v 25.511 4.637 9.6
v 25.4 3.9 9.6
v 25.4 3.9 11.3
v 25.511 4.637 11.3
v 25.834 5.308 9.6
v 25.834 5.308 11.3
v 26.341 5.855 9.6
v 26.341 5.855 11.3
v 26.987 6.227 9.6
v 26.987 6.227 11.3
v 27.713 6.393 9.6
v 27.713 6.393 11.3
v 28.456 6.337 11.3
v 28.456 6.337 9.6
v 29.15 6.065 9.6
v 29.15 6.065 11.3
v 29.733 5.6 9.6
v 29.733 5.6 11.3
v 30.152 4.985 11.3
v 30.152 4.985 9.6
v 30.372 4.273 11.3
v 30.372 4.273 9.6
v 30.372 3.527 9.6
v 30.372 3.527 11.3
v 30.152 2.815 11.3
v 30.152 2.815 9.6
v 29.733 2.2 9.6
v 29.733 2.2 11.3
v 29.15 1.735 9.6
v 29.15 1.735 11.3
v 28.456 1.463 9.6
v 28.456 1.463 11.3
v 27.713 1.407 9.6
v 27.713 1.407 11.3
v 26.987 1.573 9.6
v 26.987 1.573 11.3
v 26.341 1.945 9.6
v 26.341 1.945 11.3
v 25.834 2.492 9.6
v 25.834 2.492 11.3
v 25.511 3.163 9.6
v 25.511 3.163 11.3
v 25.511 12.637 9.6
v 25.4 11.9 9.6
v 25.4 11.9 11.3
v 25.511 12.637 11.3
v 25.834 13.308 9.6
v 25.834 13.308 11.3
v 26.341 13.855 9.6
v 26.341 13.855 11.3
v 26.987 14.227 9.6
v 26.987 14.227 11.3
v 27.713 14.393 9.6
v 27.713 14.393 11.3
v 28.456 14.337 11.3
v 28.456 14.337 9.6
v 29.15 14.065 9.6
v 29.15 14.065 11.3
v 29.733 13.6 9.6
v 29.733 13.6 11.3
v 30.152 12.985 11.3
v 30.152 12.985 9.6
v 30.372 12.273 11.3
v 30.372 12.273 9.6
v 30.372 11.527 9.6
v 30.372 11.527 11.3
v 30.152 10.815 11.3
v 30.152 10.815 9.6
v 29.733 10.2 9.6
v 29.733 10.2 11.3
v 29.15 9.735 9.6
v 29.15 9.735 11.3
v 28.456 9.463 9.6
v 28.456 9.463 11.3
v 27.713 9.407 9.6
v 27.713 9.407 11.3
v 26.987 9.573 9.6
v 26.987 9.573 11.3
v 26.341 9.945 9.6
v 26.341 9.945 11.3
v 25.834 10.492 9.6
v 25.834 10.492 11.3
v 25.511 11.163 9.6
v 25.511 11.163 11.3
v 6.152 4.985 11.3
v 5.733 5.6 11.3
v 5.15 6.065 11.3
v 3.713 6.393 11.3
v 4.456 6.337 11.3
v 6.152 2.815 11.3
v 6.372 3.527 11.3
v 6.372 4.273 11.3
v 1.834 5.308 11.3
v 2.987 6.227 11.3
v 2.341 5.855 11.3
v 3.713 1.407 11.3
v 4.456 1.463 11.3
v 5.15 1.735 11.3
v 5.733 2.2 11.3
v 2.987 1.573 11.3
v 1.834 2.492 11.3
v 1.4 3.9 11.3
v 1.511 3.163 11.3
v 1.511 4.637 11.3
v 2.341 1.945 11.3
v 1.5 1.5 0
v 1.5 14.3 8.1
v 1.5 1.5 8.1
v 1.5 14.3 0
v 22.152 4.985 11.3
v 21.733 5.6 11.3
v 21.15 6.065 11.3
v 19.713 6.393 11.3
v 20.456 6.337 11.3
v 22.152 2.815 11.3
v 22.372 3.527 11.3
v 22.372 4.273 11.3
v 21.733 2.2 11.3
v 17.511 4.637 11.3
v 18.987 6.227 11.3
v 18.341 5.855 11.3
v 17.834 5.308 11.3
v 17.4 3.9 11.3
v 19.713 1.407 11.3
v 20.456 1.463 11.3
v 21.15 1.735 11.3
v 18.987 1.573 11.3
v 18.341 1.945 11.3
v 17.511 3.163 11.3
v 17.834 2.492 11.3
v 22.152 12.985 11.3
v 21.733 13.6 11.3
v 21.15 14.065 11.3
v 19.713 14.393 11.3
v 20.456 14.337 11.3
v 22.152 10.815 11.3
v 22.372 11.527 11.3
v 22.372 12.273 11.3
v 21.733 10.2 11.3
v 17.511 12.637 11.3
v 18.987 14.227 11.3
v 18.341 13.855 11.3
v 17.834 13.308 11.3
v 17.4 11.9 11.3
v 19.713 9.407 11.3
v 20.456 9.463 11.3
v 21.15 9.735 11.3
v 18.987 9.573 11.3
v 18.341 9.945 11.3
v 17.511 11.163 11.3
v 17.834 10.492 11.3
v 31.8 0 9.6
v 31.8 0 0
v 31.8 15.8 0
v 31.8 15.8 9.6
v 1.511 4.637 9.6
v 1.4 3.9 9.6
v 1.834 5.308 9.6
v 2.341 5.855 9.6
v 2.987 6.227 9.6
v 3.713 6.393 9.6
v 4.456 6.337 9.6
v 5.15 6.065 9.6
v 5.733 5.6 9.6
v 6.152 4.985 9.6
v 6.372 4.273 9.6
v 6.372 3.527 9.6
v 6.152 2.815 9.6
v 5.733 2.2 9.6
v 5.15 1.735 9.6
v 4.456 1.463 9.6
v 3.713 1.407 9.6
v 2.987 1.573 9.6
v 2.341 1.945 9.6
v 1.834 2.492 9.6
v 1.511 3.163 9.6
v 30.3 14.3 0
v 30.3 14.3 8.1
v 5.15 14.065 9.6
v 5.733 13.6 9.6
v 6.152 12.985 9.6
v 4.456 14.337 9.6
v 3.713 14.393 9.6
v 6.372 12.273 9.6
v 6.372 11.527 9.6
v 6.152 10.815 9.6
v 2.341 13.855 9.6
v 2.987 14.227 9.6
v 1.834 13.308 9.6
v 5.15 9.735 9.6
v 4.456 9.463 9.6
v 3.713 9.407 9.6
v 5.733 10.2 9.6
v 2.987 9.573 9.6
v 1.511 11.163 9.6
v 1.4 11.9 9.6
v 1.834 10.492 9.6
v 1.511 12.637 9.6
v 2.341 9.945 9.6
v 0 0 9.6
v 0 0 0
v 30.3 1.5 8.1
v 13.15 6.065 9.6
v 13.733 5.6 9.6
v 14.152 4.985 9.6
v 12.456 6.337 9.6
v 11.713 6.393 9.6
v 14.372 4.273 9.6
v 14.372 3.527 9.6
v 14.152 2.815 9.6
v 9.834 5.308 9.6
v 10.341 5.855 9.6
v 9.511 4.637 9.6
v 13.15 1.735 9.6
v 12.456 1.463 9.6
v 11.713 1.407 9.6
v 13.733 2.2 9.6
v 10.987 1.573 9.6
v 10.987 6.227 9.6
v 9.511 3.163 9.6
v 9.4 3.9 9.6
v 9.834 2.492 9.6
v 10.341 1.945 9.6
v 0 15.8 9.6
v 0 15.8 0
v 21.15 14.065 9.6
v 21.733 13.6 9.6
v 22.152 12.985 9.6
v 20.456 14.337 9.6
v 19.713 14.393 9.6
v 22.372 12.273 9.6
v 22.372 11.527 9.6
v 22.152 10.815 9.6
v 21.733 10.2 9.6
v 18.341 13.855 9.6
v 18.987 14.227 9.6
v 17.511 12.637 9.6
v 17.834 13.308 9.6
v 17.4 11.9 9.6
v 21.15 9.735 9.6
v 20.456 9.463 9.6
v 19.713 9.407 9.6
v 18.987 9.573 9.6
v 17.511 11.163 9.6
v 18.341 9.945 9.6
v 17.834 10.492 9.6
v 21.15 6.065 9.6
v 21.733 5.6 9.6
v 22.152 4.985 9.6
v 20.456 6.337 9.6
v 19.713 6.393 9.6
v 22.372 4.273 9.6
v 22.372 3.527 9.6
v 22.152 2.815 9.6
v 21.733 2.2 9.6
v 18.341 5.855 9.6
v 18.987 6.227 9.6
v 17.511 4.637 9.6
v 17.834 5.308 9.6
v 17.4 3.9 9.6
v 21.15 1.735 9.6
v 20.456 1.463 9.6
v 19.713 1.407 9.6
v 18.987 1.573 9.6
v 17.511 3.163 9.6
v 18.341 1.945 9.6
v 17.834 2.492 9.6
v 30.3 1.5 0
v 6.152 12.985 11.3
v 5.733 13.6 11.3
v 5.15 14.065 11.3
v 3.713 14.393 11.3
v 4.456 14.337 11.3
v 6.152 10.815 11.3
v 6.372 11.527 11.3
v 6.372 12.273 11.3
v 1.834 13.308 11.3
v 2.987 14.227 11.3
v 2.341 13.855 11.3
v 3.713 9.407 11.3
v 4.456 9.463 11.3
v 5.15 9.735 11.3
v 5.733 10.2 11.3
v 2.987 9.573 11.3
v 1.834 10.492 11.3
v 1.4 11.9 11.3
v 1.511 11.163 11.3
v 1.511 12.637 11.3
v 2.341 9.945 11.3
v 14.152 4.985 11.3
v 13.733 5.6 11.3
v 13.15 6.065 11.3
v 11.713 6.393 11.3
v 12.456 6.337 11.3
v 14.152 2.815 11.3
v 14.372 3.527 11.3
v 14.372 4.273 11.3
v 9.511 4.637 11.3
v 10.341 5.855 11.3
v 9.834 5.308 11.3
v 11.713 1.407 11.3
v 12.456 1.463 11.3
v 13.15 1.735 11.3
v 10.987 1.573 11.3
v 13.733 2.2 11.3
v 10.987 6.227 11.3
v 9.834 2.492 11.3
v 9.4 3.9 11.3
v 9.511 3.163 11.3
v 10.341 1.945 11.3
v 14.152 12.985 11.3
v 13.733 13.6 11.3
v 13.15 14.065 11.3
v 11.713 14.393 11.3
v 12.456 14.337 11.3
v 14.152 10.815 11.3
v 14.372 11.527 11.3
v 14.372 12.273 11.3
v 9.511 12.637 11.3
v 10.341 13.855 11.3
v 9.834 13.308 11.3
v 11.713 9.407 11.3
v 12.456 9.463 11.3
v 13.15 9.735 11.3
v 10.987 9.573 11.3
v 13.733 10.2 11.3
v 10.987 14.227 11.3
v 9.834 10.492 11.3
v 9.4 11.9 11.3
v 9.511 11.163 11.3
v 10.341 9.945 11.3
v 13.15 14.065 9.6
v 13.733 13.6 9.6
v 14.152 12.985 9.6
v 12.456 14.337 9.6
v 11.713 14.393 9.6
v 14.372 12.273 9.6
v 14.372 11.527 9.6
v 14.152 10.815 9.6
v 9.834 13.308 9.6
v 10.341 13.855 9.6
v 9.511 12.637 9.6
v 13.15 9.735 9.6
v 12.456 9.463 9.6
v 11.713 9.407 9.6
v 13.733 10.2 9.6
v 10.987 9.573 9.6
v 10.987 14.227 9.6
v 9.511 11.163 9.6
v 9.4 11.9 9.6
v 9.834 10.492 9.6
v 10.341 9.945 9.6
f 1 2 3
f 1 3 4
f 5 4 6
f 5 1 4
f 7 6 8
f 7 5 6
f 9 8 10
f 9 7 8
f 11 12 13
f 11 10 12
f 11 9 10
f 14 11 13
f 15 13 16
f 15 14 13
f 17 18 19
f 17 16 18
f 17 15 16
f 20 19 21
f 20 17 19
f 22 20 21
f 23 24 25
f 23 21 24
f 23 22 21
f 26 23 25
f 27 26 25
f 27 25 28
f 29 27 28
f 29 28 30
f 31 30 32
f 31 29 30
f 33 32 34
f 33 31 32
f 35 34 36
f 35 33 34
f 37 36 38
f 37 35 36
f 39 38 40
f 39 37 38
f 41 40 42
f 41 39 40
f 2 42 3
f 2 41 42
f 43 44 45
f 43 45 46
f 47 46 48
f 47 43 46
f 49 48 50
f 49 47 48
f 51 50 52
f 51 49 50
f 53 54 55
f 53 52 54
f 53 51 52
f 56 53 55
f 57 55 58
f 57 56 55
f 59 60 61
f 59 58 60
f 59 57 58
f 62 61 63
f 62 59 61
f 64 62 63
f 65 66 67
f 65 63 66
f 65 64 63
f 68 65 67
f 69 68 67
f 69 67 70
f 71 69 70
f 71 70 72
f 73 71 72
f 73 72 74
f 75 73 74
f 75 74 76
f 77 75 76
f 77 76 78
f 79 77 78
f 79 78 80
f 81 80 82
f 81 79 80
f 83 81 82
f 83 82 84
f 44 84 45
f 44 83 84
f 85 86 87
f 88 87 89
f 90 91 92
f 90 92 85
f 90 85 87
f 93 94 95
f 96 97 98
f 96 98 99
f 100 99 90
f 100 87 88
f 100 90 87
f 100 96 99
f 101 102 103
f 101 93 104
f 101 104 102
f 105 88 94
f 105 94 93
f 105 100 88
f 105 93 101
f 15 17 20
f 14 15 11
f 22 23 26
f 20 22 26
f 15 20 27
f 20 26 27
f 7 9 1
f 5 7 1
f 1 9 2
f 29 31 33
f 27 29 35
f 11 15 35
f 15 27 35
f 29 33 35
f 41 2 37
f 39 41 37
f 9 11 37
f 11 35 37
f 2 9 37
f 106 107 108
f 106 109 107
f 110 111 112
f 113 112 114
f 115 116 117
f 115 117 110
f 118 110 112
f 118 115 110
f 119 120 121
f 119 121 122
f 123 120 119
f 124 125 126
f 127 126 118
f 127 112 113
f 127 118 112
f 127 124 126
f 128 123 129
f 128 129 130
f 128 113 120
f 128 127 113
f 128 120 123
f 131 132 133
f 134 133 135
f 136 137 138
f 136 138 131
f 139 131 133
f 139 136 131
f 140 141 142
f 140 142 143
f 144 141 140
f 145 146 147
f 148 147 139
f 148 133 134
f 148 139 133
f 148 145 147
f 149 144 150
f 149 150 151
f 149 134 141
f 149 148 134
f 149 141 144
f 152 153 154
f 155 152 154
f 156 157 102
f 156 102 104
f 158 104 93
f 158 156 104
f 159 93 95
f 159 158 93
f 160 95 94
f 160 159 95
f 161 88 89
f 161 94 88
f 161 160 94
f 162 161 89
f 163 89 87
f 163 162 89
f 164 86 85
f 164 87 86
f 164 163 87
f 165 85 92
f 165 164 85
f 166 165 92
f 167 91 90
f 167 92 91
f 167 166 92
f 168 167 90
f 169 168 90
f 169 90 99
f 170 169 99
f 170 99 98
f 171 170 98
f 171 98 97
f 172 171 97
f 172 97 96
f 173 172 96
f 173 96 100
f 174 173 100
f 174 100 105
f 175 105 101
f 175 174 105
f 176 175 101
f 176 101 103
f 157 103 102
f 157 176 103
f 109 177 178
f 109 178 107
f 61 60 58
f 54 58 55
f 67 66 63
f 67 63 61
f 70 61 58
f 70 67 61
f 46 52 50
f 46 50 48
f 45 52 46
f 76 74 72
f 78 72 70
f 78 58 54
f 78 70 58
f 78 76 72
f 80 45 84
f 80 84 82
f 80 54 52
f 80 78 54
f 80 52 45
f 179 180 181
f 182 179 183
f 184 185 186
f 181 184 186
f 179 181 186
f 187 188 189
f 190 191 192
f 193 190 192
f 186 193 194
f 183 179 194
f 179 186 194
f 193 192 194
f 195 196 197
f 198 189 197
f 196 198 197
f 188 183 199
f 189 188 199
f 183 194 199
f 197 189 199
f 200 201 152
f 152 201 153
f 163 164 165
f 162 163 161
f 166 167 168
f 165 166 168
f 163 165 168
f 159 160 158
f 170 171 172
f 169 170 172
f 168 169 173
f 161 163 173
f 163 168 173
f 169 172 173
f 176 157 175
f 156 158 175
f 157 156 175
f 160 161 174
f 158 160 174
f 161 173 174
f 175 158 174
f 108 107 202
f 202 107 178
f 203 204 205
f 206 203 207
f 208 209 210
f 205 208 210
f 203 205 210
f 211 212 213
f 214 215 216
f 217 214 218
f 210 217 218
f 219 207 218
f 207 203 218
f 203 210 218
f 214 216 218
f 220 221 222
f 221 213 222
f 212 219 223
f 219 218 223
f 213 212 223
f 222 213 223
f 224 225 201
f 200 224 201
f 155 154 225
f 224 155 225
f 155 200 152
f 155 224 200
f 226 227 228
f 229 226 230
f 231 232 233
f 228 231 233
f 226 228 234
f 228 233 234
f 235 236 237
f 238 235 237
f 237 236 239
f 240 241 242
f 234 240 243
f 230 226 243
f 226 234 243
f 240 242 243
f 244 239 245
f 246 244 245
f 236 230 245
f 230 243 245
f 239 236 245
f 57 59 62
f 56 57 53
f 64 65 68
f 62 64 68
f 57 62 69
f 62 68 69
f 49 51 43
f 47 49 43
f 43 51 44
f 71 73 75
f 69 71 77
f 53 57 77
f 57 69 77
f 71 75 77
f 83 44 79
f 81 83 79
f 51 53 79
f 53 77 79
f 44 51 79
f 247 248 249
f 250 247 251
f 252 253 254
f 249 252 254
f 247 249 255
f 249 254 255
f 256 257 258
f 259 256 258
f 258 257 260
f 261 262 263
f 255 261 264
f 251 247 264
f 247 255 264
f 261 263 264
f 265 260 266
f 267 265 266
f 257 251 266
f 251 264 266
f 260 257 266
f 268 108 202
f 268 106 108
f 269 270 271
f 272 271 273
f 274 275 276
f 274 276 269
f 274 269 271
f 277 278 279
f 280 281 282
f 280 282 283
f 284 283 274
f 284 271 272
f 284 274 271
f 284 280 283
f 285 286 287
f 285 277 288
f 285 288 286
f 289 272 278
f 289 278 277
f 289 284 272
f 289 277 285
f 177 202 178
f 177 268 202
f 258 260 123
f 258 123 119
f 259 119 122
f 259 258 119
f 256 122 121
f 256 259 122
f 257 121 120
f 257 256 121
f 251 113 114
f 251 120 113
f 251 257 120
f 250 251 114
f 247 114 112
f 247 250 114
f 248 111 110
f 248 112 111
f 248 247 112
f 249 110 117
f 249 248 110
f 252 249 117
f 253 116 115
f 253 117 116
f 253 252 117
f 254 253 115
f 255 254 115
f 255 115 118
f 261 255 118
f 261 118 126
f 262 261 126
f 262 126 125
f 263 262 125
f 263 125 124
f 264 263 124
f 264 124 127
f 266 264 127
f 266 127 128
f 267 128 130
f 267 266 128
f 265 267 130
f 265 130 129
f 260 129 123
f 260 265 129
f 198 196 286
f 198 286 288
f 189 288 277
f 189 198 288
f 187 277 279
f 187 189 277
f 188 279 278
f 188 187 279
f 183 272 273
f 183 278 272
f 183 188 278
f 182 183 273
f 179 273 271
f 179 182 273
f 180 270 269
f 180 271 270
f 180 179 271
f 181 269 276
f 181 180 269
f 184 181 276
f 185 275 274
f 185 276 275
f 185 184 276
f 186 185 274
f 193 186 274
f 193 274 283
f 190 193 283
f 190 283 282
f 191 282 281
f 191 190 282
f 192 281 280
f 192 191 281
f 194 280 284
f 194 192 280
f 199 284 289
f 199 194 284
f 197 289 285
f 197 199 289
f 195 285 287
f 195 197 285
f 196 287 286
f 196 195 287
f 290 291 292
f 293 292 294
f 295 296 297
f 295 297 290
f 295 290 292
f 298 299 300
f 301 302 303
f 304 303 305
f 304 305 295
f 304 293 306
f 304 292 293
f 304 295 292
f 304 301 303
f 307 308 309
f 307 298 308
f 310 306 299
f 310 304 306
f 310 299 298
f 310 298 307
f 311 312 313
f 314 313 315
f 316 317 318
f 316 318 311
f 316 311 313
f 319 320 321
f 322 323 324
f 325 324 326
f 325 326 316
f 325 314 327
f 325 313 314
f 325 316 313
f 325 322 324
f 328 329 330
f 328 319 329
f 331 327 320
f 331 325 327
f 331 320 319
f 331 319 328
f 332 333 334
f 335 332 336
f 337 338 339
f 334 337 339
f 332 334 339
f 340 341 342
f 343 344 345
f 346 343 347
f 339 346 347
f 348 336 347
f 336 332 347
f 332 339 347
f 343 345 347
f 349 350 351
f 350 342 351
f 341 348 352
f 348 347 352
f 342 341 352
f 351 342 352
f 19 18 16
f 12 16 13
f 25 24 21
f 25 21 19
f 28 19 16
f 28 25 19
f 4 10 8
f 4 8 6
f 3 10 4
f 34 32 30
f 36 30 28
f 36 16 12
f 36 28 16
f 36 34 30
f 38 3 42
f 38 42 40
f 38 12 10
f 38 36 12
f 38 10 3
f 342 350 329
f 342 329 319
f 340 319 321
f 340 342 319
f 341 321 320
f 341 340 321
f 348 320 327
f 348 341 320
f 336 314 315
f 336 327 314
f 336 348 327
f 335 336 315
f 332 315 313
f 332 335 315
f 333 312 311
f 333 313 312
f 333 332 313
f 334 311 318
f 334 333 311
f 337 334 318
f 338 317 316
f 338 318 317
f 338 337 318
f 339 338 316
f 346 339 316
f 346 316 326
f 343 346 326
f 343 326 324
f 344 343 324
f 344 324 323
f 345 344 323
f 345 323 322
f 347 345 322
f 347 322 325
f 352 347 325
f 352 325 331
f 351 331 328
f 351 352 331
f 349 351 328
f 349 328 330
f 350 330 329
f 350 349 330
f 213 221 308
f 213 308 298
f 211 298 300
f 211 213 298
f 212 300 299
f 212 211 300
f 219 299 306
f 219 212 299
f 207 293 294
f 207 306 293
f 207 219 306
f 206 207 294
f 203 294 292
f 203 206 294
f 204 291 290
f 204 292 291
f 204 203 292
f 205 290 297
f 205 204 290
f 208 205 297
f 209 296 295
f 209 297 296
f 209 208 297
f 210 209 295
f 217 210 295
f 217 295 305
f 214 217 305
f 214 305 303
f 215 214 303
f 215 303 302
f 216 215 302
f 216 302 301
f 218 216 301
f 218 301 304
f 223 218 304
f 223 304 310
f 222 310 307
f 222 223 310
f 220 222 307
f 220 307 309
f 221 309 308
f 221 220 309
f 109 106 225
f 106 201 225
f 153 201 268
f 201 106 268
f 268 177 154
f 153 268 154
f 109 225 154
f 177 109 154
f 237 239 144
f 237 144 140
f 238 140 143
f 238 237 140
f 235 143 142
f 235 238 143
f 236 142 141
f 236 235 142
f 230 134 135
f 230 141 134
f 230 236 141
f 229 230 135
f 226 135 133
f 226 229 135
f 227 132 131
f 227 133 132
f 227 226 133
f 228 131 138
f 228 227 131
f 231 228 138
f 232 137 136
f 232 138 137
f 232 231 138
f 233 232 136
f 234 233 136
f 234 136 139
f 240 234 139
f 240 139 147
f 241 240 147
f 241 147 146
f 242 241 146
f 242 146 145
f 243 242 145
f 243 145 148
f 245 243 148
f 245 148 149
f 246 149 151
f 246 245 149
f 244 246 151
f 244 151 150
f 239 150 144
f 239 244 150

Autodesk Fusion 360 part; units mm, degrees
sketch "Sketch1" plane through (0, 0, 0) normal (0, 0, 1) x (1, 0, 0) in component "LEGO"
  line L0 (0, 0) -> (31.8, 0)
  line L1 (31.8, 0) -> (31.8, 15.8)
  line L2 (31.8, 15.8) -> (0, 15.8)
  line L3 (0, 15.8) -> (0, 0)
  dimension "d1" = 31.8
  dimension "d2" = 15.8
extrude "Extrude1" add sketch "Sketch1" along normal blind 9.6 makes body 1 in component "LEGO"
sketch "Sketch2" plane through (0, 0, 9.6) normal (0, 0, 1) x (-1, 0, 0) in component "LEGO"
  line L0 (0, -15.8) -> (0, 0)
  line L1 (0, 0) -> (-31.8, 0)
  line L2 (-31.8, 0) -> (-31.8, -15.8)
  line L3 (-31.8, -15.8) -> (0, -15.8)
  circle A0 centre (-3.9, -11.9) radius 2.5
  dimension "d6" = 5
  dimension "d8" = 3.9
  dimension "d10" = 3.9
extrude "Extrude2" add sketch "Sketch2" along normal blind 1.7 separate body contours A0 makes body 2 in component "LEGO"
pattern_linear "R-Pattern1" count 1 spacing 0 along (0, 0, 1) count 4 spacing 8 along (1, 0, 0) of "Extrude2" makes body 3 makes body 4 makes body 5 in component "LEGO"
pattern_linear "R-Pattern2" count 1 spacing 0 along (1, 0, 0) count 2 spacing 8 along (0, -1, 0) of bodies 2 3 4 5 makes body 6 at (1.4124, 4.1489, 10.1667) makes body 7 at (9.4124, 4.1489, 10.1667) makes body 8 at (17.4124, 4.1489, 10.1667) makes body 9 at (25.4124, 4.1489, 10.1667) in component "LEGO"
shell "Shell1" thickness 1.5 removed faces 1 at (21.2, 5.2667, 0) on bodies 1 in component "LEGO"
component "LEGO" placed x (1, 0, 0) y (0, 1, 0) z (0, 0, 1) at (0, 0, 0)
